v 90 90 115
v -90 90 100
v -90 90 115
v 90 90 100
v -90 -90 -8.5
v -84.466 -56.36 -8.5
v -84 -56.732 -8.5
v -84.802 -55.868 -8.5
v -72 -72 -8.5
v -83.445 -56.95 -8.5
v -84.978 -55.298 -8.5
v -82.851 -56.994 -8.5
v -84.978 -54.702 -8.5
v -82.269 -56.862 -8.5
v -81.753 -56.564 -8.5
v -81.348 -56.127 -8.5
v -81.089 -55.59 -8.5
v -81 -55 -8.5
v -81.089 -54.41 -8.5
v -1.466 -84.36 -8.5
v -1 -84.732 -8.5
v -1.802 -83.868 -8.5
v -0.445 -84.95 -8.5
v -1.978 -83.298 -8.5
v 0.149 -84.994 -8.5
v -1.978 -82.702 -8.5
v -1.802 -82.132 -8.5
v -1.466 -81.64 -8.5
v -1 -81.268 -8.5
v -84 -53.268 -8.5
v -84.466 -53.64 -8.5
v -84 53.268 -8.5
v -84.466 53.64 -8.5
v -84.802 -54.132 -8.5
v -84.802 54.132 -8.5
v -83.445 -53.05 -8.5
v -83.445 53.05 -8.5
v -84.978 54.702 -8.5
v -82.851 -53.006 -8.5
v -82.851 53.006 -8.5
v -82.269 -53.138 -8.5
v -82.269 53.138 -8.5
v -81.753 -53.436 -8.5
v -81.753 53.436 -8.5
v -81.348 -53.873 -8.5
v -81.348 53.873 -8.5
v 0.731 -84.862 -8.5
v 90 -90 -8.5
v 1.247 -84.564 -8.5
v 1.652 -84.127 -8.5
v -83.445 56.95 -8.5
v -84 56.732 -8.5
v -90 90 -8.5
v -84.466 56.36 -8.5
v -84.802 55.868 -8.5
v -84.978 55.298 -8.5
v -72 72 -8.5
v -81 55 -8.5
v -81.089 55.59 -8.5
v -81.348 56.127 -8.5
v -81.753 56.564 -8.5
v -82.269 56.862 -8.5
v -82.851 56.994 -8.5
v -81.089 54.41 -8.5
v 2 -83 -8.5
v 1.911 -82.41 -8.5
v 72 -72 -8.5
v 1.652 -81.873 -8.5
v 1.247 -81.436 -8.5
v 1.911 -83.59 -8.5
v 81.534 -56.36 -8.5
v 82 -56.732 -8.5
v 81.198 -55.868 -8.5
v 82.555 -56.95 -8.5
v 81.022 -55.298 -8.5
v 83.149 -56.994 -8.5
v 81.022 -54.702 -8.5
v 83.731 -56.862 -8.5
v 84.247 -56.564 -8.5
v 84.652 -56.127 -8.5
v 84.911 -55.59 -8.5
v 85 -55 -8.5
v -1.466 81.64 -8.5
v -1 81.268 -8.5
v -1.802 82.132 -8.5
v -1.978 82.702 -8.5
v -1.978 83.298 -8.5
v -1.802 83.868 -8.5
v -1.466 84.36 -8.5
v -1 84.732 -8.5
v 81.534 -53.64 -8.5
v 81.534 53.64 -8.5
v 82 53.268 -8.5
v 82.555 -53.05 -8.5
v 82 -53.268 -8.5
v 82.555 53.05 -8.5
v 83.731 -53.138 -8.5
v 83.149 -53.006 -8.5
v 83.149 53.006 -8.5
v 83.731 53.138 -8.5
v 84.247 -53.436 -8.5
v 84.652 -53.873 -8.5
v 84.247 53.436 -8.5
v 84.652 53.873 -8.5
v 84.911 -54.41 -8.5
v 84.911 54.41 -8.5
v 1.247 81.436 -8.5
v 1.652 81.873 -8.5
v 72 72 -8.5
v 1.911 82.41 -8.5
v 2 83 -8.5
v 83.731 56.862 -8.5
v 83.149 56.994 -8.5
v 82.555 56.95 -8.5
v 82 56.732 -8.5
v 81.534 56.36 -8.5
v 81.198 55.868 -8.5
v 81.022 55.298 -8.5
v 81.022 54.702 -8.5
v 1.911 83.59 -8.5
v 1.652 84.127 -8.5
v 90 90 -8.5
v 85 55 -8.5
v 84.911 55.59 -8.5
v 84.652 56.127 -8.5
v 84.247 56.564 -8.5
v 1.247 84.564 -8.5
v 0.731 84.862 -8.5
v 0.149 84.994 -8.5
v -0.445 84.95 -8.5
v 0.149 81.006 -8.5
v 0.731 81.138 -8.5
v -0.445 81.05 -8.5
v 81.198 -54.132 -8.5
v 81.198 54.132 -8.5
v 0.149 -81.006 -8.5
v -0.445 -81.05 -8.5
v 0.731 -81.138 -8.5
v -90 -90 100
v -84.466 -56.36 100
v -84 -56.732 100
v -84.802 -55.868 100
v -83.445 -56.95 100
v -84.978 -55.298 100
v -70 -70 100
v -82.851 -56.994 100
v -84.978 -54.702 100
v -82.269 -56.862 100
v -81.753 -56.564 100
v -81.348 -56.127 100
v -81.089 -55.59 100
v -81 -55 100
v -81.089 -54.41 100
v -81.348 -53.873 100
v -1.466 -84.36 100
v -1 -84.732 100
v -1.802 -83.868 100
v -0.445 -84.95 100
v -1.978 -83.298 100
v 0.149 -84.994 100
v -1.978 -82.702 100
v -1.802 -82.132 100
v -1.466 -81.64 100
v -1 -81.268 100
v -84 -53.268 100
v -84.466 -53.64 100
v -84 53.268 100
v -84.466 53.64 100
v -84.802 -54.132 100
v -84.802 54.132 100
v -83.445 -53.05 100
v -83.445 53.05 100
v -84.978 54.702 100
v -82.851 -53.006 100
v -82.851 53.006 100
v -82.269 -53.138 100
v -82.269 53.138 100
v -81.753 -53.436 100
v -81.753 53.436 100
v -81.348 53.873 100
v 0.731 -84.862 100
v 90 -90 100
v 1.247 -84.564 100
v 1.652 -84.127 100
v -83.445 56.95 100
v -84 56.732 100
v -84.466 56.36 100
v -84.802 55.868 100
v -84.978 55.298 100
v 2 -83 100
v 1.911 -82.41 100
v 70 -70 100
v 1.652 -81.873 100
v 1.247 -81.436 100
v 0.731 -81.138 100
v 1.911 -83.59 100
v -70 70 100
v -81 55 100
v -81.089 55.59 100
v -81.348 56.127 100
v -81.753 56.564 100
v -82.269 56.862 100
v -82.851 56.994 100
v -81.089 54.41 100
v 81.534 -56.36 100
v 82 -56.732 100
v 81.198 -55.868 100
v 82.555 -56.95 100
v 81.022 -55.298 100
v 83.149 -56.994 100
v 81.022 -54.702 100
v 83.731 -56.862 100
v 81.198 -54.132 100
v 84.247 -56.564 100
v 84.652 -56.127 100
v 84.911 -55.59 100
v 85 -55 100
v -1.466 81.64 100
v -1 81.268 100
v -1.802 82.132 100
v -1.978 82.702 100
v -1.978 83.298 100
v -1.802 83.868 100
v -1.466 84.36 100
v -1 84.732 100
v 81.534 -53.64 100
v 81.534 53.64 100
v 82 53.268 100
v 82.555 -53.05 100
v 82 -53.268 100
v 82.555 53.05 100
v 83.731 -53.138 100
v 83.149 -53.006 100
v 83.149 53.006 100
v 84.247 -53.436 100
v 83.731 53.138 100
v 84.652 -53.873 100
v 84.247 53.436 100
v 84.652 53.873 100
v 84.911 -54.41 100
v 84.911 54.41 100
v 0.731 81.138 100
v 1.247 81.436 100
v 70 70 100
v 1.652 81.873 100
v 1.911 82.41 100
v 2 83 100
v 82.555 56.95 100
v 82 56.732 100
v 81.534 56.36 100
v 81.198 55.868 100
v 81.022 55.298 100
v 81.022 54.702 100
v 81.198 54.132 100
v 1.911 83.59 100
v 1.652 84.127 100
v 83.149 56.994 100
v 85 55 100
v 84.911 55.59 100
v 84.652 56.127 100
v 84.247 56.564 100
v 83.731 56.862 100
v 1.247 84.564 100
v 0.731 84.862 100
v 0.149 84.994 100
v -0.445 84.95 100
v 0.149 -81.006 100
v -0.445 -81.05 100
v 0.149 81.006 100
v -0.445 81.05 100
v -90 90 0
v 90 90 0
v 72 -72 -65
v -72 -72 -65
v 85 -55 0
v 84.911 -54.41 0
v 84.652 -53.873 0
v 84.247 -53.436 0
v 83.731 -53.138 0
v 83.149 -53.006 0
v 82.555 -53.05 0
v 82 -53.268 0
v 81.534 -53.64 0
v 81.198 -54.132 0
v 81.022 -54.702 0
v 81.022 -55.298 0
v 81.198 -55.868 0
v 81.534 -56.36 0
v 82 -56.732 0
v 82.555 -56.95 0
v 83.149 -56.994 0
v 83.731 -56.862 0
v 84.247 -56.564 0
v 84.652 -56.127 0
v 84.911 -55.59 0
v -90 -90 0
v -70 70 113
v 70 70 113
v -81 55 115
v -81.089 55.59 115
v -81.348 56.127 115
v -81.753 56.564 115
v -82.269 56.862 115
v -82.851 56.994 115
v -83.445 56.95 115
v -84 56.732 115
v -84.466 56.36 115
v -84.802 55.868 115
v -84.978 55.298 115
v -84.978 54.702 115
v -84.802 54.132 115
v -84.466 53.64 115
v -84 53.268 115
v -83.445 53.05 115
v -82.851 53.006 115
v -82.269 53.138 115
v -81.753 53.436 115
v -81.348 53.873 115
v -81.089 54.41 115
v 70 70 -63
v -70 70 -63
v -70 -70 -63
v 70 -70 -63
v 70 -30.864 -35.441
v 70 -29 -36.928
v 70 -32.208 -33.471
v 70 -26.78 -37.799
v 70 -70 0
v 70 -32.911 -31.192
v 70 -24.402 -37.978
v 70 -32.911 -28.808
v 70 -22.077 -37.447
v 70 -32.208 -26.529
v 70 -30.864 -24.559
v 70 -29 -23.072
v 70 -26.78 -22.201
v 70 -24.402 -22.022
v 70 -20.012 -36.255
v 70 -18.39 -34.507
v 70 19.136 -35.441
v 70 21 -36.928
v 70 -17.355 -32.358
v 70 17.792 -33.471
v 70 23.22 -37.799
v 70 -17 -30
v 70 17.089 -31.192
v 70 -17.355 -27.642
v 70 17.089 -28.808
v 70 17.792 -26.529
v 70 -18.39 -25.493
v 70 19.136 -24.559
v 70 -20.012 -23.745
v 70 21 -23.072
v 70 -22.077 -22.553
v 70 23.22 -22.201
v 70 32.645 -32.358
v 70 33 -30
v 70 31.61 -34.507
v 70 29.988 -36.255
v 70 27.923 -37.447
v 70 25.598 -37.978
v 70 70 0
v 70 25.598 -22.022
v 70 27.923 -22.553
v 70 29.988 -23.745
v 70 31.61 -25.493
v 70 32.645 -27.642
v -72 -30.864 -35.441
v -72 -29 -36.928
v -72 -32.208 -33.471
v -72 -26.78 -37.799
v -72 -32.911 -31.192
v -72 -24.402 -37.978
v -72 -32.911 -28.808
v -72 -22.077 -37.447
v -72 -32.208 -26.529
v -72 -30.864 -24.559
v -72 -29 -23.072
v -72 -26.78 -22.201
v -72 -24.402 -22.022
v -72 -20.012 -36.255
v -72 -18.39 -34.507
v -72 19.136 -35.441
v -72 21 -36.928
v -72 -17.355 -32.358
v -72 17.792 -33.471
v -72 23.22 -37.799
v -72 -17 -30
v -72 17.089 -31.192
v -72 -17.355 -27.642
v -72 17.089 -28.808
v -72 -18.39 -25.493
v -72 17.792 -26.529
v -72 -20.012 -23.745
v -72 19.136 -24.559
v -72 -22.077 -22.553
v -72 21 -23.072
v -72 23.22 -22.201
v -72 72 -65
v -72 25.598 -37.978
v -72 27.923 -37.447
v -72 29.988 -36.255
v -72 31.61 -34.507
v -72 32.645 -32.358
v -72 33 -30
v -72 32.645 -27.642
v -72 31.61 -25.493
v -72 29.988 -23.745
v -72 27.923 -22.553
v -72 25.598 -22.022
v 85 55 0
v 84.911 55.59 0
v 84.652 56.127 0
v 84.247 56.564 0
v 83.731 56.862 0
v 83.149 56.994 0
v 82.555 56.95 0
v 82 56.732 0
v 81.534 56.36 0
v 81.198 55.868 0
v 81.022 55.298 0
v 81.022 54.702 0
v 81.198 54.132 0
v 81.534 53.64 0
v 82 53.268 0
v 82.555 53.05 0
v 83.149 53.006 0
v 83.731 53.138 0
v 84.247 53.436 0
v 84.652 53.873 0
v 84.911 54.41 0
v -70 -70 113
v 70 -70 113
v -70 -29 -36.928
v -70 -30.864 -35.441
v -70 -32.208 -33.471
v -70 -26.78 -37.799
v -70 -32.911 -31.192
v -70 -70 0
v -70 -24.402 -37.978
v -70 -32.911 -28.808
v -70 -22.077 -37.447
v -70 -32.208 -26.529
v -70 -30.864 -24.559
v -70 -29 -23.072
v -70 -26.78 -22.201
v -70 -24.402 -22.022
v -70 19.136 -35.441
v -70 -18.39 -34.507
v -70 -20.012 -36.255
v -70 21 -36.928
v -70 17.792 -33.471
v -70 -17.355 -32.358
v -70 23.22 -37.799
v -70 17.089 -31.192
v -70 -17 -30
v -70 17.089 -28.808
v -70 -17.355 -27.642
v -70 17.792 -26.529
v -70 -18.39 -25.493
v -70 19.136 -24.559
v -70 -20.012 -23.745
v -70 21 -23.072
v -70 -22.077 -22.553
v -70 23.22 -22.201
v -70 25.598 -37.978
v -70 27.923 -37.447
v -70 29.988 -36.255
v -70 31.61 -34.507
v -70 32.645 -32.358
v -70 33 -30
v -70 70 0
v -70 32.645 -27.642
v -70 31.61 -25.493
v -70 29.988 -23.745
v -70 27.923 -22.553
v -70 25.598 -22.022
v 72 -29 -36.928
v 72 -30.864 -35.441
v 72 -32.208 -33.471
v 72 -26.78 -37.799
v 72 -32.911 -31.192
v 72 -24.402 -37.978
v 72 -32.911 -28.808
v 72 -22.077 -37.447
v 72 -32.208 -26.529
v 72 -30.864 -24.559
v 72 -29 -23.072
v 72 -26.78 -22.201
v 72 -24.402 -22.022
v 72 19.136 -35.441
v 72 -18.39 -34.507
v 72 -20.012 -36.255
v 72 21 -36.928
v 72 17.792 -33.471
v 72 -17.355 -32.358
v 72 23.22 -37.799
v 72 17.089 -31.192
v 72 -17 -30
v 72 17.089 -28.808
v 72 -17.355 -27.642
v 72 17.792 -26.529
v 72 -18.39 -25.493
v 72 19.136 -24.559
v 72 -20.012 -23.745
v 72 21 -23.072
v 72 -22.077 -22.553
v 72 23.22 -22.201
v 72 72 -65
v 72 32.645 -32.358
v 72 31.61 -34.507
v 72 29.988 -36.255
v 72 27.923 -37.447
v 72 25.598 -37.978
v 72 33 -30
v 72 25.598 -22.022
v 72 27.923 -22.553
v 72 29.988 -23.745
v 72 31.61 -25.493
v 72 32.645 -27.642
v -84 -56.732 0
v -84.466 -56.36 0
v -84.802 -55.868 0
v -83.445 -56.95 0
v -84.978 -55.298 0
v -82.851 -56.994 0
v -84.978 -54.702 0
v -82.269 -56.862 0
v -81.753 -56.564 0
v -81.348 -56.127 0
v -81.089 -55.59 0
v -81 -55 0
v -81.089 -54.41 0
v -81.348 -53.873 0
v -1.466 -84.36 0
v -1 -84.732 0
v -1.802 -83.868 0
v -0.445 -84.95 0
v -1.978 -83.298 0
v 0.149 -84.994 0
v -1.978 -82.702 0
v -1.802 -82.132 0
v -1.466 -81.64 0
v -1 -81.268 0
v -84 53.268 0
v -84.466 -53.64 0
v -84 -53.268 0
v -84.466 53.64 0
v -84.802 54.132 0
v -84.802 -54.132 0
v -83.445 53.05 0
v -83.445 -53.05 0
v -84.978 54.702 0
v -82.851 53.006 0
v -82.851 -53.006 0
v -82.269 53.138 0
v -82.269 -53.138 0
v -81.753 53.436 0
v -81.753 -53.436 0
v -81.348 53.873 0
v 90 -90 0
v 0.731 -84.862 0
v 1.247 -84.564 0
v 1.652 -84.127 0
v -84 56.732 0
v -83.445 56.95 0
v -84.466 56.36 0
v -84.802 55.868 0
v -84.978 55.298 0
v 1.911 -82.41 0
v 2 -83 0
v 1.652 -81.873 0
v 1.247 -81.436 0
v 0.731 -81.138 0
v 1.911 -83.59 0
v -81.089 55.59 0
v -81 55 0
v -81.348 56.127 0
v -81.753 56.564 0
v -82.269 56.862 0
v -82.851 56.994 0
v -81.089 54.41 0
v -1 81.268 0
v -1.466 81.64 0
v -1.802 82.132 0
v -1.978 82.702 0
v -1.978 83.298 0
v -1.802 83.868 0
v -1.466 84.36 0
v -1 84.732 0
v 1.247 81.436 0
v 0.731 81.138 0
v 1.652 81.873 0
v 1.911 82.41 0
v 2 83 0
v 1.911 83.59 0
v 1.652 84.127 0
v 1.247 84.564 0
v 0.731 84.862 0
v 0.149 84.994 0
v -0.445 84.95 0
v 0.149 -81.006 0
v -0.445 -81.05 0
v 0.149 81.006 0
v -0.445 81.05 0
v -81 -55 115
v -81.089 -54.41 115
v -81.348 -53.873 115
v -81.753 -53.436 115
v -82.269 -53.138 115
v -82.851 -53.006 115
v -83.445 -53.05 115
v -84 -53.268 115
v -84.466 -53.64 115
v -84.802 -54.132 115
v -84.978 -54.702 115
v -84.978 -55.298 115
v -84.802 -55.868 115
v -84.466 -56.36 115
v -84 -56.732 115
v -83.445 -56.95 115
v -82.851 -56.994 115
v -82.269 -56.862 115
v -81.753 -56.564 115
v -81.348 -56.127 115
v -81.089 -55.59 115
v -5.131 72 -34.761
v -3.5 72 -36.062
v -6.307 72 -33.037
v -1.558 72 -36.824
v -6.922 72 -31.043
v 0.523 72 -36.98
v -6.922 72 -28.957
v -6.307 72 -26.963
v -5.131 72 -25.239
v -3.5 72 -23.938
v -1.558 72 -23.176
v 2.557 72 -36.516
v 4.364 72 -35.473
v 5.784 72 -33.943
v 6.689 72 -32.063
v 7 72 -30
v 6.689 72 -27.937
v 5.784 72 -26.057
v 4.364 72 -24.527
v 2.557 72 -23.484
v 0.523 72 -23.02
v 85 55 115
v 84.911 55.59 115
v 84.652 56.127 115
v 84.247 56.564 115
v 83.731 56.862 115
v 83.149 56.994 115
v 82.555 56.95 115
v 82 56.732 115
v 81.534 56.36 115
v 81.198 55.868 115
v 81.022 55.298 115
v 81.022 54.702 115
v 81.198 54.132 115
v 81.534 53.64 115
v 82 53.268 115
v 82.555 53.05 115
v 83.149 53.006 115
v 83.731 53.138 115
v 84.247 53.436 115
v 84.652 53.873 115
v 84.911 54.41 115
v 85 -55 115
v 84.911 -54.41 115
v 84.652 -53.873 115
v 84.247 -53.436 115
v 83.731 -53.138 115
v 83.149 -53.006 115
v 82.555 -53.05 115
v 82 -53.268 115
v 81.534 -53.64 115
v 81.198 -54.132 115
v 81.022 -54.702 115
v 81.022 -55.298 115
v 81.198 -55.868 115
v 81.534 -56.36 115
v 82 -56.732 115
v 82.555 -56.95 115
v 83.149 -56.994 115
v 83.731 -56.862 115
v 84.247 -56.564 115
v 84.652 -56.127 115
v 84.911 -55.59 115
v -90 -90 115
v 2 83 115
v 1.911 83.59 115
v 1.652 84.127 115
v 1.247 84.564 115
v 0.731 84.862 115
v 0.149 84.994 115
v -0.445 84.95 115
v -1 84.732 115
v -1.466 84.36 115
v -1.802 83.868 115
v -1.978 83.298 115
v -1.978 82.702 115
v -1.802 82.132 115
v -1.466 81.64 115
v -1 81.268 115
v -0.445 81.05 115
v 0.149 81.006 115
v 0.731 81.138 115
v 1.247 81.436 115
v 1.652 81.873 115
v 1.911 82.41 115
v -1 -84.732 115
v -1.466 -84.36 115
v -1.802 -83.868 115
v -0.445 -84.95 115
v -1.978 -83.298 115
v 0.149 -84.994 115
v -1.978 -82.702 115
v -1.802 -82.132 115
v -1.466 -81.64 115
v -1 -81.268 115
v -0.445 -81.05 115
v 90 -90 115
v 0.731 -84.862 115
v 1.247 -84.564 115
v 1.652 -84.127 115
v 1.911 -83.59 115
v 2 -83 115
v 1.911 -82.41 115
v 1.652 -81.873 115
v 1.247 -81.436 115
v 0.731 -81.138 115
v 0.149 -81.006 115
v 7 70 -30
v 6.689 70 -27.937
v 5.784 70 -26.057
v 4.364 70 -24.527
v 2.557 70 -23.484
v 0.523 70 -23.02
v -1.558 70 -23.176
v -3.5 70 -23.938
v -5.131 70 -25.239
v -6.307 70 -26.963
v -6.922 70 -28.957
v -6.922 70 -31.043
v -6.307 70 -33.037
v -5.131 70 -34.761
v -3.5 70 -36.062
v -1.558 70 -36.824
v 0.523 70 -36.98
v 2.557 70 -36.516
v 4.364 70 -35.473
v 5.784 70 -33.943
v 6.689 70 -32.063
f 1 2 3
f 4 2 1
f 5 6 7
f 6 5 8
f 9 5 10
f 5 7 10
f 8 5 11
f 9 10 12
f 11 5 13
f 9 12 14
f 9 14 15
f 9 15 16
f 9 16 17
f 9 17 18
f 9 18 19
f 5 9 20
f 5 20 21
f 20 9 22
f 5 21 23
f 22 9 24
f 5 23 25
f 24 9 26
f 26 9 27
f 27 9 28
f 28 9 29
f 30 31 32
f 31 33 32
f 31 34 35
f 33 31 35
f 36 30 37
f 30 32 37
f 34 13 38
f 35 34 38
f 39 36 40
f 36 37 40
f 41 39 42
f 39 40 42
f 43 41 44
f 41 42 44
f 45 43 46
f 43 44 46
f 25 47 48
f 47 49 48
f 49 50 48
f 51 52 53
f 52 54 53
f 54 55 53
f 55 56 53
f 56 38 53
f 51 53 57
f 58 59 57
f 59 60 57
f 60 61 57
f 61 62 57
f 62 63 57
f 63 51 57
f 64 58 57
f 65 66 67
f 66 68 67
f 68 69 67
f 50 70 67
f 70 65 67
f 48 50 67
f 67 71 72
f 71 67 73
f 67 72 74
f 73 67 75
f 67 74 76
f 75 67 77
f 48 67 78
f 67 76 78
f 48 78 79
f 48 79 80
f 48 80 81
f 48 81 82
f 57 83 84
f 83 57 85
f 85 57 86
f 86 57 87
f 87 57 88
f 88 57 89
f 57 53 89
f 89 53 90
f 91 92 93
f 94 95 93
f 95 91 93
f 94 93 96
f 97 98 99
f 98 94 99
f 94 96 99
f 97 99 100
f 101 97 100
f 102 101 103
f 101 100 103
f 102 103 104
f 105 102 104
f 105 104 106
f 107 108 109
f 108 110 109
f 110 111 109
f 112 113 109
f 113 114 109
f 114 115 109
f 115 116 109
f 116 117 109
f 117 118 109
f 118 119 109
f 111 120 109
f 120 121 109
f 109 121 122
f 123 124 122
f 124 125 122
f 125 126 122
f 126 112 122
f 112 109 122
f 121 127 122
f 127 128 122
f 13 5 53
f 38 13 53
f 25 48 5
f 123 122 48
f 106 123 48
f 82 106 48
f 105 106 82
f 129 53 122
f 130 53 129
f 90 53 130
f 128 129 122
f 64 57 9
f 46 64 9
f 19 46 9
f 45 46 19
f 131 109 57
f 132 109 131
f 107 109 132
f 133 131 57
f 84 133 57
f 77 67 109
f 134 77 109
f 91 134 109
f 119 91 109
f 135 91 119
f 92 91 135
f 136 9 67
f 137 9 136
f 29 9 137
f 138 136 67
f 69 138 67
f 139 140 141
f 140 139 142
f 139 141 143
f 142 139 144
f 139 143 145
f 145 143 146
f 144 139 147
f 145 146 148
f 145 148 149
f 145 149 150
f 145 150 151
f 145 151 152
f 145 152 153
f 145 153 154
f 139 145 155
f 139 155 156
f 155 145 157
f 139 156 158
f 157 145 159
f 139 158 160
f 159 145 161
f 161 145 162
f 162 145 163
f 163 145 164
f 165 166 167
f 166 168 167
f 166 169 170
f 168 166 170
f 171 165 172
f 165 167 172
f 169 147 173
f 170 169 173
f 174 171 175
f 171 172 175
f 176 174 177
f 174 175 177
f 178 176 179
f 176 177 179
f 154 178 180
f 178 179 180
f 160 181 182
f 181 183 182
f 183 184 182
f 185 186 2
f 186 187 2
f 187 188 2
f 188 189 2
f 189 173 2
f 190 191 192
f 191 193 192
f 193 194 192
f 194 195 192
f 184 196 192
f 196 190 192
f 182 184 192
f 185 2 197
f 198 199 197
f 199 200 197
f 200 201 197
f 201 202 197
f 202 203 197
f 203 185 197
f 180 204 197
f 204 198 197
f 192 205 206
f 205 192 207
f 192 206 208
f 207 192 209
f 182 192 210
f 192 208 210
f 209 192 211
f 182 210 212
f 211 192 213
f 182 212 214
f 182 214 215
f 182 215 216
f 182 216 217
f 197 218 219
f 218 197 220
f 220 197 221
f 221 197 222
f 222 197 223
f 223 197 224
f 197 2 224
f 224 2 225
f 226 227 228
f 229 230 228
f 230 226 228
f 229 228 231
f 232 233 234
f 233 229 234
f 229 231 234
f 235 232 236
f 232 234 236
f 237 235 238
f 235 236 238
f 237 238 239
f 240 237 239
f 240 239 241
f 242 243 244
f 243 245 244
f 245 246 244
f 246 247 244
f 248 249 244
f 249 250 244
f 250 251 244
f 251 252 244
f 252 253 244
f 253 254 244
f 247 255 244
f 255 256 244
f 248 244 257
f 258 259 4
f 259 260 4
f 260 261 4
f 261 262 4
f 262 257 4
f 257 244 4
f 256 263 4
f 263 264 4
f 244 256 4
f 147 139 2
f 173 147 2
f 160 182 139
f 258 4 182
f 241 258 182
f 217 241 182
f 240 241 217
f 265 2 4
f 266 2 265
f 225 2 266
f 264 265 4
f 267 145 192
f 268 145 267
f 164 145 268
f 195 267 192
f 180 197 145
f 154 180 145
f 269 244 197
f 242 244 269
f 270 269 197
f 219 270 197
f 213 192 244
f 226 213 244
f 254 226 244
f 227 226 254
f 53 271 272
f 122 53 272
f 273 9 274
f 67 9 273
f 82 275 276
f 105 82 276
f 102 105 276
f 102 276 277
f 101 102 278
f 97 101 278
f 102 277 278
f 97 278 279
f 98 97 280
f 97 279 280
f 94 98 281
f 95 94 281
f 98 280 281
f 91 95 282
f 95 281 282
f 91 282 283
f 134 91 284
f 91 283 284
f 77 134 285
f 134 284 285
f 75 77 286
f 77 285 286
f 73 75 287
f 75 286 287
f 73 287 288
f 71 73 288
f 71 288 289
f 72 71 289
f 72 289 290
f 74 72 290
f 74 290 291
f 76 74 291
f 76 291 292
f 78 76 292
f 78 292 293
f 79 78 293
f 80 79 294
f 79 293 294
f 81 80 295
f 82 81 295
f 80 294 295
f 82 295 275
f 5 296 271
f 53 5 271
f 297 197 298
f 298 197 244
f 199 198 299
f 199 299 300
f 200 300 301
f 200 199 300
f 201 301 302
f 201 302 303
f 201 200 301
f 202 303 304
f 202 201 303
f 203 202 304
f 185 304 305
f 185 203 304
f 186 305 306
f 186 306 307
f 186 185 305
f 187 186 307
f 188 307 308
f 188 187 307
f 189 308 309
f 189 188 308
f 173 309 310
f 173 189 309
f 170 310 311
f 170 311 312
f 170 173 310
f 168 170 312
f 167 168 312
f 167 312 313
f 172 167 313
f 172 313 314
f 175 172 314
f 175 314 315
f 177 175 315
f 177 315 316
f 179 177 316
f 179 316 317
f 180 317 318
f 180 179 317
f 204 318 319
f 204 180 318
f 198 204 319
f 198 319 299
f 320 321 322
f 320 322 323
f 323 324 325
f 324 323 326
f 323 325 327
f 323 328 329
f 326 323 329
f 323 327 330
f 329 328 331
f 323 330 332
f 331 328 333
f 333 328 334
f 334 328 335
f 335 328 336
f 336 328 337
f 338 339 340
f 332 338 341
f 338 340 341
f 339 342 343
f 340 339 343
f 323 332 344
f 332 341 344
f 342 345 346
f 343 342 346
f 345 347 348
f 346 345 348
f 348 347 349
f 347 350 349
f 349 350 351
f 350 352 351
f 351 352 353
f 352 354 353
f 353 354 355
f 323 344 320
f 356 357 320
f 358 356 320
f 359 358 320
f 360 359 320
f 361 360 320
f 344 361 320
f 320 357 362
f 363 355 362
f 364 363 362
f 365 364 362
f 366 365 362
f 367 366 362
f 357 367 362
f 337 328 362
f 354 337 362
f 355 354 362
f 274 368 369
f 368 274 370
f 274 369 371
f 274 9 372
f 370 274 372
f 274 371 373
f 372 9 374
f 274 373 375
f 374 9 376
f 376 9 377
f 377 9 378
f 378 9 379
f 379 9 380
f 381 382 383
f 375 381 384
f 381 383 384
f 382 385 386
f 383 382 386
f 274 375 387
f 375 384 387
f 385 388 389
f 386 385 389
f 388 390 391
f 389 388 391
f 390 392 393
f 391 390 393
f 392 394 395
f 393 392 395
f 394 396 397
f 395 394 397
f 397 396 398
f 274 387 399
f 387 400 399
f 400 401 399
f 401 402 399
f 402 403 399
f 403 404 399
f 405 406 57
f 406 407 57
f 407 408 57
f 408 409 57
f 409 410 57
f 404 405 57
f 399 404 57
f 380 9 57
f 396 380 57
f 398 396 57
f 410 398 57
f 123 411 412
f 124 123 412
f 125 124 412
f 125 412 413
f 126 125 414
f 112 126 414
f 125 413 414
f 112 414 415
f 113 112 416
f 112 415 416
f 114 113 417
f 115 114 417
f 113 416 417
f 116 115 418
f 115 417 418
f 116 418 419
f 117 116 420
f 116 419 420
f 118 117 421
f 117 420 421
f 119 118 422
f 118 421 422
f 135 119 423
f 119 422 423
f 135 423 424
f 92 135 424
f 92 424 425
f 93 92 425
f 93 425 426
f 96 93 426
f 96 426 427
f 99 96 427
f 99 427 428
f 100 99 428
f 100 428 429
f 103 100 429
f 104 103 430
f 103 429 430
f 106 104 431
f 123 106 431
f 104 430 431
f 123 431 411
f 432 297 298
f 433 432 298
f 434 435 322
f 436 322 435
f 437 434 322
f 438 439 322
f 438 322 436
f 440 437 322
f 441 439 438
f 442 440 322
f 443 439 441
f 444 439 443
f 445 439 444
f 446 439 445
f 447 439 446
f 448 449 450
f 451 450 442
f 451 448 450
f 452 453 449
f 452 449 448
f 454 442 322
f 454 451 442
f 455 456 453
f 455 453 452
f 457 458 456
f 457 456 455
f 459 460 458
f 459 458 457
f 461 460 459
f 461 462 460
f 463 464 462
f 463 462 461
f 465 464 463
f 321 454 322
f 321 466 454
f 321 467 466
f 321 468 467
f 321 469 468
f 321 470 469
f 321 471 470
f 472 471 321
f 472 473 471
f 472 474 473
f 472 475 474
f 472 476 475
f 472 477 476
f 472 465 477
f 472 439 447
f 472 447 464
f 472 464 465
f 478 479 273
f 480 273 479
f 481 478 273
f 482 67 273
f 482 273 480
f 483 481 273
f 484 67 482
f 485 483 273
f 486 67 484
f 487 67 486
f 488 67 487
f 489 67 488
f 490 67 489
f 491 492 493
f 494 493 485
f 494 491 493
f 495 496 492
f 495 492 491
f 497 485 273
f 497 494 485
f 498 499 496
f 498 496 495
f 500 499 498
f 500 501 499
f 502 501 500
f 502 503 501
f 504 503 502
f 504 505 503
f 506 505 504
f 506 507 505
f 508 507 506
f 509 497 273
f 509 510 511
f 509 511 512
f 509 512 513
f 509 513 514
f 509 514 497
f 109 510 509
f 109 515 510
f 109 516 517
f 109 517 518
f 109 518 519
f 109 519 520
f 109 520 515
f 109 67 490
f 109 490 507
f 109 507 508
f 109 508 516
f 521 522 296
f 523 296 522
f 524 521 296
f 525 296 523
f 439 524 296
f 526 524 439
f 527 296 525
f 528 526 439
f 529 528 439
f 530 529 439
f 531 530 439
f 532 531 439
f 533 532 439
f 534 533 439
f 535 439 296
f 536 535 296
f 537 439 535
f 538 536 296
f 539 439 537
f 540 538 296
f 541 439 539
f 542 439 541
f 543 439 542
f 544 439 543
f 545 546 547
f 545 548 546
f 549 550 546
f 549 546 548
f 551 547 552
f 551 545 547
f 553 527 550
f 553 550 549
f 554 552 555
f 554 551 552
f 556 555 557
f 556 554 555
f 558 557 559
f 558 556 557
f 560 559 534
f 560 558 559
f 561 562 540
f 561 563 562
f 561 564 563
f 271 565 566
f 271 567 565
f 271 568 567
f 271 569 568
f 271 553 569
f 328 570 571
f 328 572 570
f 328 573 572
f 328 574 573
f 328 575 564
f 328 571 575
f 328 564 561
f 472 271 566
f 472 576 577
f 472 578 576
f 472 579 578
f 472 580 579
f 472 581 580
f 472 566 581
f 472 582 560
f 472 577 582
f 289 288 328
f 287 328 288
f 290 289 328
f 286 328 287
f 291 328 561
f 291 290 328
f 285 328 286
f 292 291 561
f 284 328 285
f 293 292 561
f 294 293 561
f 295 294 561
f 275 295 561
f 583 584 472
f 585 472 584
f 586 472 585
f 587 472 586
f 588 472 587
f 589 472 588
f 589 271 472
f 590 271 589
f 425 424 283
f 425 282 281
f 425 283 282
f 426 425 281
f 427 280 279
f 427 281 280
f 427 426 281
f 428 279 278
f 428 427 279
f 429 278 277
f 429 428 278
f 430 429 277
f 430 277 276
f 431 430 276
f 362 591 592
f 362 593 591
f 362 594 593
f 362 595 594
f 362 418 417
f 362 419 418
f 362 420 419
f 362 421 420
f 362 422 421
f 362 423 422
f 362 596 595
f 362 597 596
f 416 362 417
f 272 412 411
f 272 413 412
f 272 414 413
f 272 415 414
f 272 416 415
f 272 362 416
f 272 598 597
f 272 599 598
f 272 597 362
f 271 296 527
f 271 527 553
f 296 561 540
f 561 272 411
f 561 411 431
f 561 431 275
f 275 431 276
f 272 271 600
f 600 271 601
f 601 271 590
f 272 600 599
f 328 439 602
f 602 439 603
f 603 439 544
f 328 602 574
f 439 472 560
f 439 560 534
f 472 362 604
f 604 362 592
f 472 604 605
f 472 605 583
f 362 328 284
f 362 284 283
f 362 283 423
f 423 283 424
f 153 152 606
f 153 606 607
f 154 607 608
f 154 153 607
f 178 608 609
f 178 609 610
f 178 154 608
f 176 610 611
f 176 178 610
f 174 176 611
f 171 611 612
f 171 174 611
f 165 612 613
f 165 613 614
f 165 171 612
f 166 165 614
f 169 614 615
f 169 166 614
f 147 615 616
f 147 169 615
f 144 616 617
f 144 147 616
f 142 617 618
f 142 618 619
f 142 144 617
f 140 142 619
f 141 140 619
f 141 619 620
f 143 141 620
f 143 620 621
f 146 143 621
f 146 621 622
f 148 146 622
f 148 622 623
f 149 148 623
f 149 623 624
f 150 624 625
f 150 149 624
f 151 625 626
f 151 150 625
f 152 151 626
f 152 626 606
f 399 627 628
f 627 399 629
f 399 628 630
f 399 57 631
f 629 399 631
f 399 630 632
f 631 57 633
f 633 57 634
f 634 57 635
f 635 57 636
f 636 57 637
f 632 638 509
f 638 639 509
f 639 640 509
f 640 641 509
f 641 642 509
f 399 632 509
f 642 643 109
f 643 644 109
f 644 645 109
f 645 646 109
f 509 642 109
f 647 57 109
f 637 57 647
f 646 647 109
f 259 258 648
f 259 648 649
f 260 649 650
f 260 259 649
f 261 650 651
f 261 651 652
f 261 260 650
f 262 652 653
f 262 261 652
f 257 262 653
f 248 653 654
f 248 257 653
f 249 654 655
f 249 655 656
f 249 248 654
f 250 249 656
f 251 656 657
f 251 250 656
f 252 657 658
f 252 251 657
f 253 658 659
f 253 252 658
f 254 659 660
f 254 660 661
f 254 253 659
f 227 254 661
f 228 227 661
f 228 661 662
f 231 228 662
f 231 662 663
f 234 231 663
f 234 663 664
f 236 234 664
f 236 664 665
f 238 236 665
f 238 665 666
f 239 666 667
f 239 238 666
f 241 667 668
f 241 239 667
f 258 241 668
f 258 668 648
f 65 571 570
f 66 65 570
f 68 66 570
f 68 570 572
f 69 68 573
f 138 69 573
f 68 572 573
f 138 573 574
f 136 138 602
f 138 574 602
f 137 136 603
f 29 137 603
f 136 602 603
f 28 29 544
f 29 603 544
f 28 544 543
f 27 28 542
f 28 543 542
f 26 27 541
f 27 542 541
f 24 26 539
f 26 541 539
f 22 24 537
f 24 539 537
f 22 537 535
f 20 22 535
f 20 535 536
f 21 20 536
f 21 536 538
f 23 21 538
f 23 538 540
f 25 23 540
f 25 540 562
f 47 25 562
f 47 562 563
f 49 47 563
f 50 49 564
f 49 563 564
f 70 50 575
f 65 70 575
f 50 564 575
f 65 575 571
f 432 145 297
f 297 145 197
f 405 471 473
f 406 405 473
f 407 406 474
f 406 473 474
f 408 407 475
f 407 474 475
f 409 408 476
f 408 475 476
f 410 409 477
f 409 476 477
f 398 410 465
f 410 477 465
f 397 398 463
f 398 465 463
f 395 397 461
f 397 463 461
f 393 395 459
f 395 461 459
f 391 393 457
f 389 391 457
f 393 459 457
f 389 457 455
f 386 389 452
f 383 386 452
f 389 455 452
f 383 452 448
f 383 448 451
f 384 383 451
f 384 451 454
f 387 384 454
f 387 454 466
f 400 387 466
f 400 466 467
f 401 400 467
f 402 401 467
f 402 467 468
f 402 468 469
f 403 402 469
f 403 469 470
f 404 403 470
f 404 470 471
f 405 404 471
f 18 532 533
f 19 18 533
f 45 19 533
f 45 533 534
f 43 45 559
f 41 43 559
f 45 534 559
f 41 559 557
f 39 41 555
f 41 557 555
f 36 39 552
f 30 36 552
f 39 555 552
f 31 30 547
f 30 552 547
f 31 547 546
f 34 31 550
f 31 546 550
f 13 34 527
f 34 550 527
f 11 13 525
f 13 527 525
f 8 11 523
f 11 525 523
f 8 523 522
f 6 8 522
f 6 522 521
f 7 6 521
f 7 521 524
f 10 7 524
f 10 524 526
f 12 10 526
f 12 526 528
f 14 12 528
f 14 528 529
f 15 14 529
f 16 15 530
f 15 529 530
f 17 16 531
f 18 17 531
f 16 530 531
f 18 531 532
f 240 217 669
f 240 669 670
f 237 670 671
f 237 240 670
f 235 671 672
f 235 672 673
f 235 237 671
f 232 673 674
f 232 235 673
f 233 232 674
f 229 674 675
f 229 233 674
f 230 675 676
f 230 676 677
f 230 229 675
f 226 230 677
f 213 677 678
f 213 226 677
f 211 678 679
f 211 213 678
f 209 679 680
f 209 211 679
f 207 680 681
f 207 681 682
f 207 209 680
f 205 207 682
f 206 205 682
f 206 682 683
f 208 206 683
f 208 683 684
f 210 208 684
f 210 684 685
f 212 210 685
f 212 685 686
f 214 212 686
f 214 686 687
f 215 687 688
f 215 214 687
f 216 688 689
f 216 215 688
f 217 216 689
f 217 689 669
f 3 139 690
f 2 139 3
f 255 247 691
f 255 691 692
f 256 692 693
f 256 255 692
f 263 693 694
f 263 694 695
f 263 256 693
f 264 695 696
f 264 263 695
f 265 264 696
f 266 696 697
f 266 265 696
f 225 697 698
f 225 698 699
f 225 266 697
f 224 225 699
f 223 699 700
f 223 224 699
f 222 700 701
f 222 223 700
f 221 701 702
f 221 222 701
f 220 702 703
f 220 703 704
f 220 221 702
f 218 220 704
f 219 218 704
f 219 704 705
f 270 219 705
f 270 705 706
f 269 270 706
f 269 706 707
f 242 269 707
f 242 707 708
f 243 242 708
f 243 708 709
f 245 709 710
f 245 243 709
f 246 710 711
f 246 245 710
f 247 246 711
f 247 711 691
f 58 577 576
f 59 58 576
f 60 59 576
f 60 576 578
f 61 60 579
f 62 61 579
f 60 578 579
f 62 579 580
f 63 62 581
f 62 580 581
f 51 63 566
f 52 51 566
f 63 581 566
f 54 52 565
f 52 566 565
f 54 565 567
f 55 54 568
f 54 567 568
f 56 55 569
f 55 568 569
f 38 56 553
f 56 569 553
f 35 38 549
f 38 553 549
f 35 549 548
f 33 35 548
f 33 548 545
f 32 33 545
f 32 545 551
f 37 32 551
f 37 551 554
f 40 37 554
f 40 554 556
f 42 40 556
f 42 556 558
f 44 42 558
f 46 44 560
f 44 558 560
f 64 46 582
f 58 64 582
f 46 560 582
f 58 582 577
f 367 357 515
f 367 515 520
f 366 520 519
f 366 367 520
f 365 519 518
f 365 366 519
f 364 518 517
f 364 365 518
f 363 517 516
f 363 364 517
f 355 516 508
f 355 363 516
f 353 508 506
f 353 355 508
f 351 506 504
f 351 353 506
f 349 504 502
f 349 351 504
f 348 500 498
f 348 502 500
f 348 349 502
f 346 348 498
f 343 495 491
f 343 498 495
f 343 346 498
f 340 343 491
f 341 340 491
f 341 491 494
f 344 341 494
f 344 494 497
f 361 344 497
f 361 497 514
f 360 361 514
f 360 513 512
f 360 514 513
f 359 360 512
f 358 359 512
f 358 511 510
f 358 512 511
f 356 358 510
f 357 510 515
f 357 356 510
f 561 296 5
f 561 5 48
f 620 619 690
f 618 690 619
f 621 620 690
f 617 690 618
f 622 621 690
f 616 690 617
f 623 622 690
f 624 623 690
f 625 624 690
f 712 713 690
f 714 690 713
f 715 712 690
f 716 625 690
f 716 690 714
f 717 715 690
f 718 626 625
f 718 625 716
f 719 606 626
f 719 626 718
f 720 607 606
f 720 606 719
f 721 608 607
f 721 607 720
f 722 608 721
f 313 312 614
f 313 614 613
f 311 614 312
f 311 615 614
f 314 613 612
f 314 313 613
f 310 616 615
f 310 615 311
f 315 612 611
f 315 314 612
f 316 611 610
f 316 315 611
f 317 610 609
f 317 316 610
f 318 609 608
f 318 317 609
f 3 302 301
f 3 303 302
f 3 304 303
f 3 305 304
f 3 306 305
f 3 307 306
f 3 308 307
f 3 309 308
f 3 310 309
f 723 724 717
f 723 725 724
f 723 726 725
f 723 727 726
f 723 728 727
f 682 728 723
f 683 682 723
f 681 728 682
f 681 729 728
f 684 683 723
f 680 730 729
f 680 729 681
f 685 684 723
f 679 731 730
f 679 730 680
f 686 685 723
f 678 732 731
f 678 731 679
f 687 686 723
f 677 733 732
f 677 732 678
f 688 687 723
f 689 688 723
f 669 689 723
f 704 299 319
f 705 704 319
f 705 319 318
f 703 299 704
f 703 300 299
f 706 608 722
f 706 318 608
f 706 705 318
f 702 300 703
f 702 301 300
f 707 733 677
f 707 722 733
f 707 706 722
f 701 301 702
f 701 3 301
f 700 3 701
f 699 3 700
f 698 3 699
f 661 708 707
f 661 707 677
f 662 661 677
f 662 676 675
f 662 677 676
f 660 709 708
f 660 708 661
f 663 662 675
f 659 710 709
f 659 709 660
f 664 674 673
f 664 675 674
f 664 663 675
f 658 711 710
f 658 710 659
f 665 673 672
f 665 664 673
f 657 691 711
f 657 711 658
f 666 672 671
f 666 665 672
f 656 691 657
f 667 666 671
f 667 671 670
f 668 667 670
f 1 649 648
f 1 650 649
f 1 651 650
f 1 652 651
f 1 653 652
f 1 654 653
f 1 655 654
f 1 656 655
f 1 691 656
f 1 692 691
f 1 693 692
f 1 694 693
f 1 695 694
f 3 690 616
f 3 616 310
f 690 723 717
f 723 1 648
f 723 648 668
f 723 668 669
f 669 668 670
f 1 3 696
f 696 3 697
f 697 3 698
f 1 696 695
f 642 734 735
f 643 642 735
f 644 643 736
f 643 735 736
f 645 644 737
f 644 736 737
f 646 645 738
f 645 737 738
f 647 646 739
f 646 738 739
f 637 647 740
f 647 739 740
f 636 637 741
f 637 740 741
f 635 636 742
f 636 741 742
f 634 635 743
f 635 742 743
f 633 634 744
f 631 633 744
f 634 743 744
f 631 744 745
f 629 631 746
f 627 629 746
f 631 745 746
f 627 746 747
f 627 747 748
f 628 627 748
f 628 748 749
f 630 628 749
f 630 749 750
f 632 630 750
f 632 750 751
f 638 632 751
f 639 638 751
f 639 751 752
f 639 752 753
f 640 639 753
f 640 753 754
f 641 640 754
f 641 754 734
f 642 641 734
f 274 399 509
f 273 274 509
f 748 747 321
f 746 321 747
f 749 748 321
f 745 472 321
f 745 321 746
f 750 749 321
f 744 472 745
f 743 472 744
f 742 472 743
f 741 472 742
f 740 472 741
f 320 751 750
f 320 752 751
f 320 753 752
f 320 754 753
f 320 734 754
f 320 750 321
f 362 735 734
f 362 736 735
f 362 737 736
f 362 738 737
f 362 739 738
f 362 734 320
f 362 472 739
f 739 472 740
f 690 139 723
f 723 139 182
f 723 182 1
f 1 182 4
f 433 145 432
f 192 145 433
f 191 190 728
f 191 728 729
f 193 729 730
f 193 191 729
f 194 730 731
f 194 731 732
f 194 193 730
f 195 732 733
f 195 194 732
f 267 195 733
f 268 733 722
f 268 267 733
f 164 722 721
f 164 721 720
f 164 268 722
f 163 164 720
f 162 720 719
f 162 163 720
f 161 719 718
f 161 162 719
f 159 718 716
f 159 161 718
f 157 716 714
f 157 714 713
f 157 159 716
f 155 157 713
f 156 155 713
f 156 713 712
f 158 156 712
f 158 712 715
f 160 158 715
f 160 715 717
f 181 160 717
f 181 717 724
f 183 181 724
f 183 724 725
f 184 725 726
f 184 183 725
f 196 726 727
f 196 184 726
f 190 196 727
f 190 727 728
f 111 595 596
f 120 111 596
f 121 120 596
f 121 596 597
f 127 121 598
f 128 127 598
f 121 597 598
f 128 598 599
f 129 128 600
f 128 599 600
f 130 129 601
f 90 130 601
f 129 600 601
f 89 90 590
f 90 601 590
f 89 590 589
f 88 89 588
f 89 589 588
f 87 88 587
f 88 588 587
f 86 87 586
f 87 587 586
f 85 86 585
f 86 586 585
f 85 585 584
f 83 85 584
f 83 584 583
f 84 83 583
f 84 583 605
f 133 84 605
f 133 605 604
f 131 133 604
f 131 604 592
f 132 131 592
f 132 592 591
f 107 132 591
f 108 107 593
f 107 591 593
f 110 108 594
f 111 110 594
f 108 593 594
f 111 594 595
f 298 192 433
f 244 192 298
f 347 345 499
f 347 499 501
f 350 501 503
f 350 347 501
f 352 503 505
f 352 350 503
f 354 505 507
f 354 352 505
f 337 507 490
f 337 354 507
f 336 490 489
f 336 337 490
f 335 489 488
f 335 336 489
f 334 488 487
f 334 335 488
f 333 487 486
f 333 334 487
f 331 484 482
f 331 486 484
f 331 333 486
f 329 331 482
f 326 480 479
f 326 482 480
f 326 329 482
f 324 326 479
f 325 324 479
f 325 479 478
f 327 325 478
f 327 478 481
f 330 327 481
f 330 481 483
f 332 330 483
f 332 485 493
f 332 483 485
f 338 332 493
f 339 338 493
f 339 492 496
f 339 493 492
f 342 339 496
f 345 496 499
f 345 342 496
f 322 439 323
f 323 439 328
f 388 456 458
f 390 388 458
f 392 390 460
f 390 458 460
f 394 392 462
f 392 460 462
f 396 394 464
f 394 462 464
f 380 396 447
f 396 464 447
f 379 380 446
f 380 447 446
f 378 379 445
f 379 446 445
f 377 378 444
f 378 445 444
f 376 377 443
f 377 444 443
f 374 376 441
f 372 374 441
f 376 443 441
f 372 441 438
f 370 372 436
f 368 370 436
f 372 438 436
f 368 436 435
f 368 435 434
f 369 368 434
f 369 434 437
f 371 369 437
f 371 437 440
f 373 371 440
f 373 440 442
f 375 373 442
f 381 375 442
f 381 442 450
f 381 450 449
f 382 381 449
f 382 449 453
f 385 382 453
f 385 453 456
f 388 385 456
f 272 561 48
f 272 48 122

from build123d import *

# Parameters (mm, degrees)
F0_W           = 144
F0_H           = 144
F1_DEPTH       = 65
F2_T           = -2
F3_W           = 180
F3_H           = 180
F4_DEPTH       = 8.5
F5_W           = 140
F5_H           = 140
F6_DEPTH       = 10
F7_R           = 2
F8_DEPTH       = 8.5
F8_DEPTH_BACK  = 150
F9_R           = 2
F10_DEPTH      = 8.5
F10_DEPTH_BACK = 150
F12_W          = 180
F12_H          = 180
F13_DEPTH      = 15
F14_W          = 140
F14_H          = 140
F15_DEPTH      = 13
F16_R          = 2
F17_DEPTH      = 15
F18_R          = 8
F19_DEPTH      = 100
F19_DEPTH_BACK = 100
F20_R          = 7
F21_DEPTH      = 100


with BuildPart() as f1:
    # F0 (on Top) → F1 (new body)
    with BuildSketch(Plane.XY):
        Rectangle(F0_W, F0_H)
    extrude(amount=-F1_DEPTH)

    # F2
    f2_openings = [f1.faces().sort_by_distance(p)[0] for p in [
        (0, 0, 0),
    ]]
    offset(amount=F2_T, openings=f2_openings)

    # F3 (on Top) → F4 (join)
    with BuildSketch(Plane.XY):
        Rectangle(F3_W, F3_H)
    extrude(amount=-F4_DEPTH)

    # F5 (on Top) → F6 (cut)
    with BuildSketch(Plane.XY):
        Rectangle(F5_W, F5_H)
    extrude(amount=-F6_DEPTH, mode=Mode.SUBTRACT)

    # F7 (on Top) → F8 (cut, two sides)
    with BuildSketch(Plane.XY) as f8_sk:
        with Locations((-83, 55)):
            Circle(F7_R)
        with Locations((-83, -55)):
            Circle(F7_R)
        with Locations((83, 55)):
            Circle(F7_R)
        with Locations((83, -55)):
            Circle(F7_R)
    extrude(amount=-F8_DEPTH, mode=Mode.SUBTRACT)
    extrude(f8_sk.sketch, amount=F8_DEPTH_BACK, mode=Mode.SUBTRACT)

    # F9 (on Top) → F10 (cut, two sides)
    with BuildSketch(Plane.XY) as f10_sk:
        with Locations((0, 83)):
            Circle(F9_R)
        with Locations((0, -83)):
            Circle(F9_R)
    extrude(amount=-F10_DEPTH, mode=Mode.SUBTRACT)
    extrude(f10_sk.sketch, amount=F10_DEPTH_BACK, mode=Mode.SUBTRACT)

    # F18 (on Right) → F19 (cut, two sides)
    with BuildSketch(Plane.YZ) as f19_sk:
        with Locations((-25, -30)):
            Circle(F18_R)
        with Locations((25, -30)):
            Circle(F18_R)
    extrude(amount=-F19_DEPTH, mode=Mode.SUBTRACT)
    extrude(f19_sk.sketch, amount=F19_DEPTH_BACK, mode=Mode.SUBTRACT)

    # F20 (on Front) → F21 (cut)
    with BuildSketch(Plane.XZ):
        with Locations((0, -30)):
            Circle(F20_R)
    extrude(amount=-F21_DEPTH, mode=Mode.SUBTRACT)


with BuildPart() as f13:
    # F12 (on offset) → F13 (new body)
    with BuildSketch(Plane.XY.offset(100)):
        Rectangle(F12_W, F12_H)
    extrude(amount=F13_DEPTH)

    # F14 (on offset) → F15 (cut)
    with BuildSketch(Plane.XY.offset(100)):
        Rectangle(F14_W, F14_H)
    extrude(amount=F15_DEPTH, mode=Mode.SUBTRACT)

    # F16 (on offset) → F17 (cut, through all)
    with BuildSketch(Plane.XY.offset(100)):
        with Locations((-83, 55)):
            Circle(F16_R)
        with Locations((-83, -55)):
            Circle(F16_R)
        with Locations((0, -83)):
            Circle(F16_R)
        with Locations((83, -55)):
            Circle(F16_R)
        with Locations((0, 83)):
            Circle(F16_R)
        with Locations((83, 55)):
            Circle(F16_R)
    extrude(amount=F17_DEPTH, mode=Mode.SUBTRACT)


solid = Compound([f1.part, f13.part])
